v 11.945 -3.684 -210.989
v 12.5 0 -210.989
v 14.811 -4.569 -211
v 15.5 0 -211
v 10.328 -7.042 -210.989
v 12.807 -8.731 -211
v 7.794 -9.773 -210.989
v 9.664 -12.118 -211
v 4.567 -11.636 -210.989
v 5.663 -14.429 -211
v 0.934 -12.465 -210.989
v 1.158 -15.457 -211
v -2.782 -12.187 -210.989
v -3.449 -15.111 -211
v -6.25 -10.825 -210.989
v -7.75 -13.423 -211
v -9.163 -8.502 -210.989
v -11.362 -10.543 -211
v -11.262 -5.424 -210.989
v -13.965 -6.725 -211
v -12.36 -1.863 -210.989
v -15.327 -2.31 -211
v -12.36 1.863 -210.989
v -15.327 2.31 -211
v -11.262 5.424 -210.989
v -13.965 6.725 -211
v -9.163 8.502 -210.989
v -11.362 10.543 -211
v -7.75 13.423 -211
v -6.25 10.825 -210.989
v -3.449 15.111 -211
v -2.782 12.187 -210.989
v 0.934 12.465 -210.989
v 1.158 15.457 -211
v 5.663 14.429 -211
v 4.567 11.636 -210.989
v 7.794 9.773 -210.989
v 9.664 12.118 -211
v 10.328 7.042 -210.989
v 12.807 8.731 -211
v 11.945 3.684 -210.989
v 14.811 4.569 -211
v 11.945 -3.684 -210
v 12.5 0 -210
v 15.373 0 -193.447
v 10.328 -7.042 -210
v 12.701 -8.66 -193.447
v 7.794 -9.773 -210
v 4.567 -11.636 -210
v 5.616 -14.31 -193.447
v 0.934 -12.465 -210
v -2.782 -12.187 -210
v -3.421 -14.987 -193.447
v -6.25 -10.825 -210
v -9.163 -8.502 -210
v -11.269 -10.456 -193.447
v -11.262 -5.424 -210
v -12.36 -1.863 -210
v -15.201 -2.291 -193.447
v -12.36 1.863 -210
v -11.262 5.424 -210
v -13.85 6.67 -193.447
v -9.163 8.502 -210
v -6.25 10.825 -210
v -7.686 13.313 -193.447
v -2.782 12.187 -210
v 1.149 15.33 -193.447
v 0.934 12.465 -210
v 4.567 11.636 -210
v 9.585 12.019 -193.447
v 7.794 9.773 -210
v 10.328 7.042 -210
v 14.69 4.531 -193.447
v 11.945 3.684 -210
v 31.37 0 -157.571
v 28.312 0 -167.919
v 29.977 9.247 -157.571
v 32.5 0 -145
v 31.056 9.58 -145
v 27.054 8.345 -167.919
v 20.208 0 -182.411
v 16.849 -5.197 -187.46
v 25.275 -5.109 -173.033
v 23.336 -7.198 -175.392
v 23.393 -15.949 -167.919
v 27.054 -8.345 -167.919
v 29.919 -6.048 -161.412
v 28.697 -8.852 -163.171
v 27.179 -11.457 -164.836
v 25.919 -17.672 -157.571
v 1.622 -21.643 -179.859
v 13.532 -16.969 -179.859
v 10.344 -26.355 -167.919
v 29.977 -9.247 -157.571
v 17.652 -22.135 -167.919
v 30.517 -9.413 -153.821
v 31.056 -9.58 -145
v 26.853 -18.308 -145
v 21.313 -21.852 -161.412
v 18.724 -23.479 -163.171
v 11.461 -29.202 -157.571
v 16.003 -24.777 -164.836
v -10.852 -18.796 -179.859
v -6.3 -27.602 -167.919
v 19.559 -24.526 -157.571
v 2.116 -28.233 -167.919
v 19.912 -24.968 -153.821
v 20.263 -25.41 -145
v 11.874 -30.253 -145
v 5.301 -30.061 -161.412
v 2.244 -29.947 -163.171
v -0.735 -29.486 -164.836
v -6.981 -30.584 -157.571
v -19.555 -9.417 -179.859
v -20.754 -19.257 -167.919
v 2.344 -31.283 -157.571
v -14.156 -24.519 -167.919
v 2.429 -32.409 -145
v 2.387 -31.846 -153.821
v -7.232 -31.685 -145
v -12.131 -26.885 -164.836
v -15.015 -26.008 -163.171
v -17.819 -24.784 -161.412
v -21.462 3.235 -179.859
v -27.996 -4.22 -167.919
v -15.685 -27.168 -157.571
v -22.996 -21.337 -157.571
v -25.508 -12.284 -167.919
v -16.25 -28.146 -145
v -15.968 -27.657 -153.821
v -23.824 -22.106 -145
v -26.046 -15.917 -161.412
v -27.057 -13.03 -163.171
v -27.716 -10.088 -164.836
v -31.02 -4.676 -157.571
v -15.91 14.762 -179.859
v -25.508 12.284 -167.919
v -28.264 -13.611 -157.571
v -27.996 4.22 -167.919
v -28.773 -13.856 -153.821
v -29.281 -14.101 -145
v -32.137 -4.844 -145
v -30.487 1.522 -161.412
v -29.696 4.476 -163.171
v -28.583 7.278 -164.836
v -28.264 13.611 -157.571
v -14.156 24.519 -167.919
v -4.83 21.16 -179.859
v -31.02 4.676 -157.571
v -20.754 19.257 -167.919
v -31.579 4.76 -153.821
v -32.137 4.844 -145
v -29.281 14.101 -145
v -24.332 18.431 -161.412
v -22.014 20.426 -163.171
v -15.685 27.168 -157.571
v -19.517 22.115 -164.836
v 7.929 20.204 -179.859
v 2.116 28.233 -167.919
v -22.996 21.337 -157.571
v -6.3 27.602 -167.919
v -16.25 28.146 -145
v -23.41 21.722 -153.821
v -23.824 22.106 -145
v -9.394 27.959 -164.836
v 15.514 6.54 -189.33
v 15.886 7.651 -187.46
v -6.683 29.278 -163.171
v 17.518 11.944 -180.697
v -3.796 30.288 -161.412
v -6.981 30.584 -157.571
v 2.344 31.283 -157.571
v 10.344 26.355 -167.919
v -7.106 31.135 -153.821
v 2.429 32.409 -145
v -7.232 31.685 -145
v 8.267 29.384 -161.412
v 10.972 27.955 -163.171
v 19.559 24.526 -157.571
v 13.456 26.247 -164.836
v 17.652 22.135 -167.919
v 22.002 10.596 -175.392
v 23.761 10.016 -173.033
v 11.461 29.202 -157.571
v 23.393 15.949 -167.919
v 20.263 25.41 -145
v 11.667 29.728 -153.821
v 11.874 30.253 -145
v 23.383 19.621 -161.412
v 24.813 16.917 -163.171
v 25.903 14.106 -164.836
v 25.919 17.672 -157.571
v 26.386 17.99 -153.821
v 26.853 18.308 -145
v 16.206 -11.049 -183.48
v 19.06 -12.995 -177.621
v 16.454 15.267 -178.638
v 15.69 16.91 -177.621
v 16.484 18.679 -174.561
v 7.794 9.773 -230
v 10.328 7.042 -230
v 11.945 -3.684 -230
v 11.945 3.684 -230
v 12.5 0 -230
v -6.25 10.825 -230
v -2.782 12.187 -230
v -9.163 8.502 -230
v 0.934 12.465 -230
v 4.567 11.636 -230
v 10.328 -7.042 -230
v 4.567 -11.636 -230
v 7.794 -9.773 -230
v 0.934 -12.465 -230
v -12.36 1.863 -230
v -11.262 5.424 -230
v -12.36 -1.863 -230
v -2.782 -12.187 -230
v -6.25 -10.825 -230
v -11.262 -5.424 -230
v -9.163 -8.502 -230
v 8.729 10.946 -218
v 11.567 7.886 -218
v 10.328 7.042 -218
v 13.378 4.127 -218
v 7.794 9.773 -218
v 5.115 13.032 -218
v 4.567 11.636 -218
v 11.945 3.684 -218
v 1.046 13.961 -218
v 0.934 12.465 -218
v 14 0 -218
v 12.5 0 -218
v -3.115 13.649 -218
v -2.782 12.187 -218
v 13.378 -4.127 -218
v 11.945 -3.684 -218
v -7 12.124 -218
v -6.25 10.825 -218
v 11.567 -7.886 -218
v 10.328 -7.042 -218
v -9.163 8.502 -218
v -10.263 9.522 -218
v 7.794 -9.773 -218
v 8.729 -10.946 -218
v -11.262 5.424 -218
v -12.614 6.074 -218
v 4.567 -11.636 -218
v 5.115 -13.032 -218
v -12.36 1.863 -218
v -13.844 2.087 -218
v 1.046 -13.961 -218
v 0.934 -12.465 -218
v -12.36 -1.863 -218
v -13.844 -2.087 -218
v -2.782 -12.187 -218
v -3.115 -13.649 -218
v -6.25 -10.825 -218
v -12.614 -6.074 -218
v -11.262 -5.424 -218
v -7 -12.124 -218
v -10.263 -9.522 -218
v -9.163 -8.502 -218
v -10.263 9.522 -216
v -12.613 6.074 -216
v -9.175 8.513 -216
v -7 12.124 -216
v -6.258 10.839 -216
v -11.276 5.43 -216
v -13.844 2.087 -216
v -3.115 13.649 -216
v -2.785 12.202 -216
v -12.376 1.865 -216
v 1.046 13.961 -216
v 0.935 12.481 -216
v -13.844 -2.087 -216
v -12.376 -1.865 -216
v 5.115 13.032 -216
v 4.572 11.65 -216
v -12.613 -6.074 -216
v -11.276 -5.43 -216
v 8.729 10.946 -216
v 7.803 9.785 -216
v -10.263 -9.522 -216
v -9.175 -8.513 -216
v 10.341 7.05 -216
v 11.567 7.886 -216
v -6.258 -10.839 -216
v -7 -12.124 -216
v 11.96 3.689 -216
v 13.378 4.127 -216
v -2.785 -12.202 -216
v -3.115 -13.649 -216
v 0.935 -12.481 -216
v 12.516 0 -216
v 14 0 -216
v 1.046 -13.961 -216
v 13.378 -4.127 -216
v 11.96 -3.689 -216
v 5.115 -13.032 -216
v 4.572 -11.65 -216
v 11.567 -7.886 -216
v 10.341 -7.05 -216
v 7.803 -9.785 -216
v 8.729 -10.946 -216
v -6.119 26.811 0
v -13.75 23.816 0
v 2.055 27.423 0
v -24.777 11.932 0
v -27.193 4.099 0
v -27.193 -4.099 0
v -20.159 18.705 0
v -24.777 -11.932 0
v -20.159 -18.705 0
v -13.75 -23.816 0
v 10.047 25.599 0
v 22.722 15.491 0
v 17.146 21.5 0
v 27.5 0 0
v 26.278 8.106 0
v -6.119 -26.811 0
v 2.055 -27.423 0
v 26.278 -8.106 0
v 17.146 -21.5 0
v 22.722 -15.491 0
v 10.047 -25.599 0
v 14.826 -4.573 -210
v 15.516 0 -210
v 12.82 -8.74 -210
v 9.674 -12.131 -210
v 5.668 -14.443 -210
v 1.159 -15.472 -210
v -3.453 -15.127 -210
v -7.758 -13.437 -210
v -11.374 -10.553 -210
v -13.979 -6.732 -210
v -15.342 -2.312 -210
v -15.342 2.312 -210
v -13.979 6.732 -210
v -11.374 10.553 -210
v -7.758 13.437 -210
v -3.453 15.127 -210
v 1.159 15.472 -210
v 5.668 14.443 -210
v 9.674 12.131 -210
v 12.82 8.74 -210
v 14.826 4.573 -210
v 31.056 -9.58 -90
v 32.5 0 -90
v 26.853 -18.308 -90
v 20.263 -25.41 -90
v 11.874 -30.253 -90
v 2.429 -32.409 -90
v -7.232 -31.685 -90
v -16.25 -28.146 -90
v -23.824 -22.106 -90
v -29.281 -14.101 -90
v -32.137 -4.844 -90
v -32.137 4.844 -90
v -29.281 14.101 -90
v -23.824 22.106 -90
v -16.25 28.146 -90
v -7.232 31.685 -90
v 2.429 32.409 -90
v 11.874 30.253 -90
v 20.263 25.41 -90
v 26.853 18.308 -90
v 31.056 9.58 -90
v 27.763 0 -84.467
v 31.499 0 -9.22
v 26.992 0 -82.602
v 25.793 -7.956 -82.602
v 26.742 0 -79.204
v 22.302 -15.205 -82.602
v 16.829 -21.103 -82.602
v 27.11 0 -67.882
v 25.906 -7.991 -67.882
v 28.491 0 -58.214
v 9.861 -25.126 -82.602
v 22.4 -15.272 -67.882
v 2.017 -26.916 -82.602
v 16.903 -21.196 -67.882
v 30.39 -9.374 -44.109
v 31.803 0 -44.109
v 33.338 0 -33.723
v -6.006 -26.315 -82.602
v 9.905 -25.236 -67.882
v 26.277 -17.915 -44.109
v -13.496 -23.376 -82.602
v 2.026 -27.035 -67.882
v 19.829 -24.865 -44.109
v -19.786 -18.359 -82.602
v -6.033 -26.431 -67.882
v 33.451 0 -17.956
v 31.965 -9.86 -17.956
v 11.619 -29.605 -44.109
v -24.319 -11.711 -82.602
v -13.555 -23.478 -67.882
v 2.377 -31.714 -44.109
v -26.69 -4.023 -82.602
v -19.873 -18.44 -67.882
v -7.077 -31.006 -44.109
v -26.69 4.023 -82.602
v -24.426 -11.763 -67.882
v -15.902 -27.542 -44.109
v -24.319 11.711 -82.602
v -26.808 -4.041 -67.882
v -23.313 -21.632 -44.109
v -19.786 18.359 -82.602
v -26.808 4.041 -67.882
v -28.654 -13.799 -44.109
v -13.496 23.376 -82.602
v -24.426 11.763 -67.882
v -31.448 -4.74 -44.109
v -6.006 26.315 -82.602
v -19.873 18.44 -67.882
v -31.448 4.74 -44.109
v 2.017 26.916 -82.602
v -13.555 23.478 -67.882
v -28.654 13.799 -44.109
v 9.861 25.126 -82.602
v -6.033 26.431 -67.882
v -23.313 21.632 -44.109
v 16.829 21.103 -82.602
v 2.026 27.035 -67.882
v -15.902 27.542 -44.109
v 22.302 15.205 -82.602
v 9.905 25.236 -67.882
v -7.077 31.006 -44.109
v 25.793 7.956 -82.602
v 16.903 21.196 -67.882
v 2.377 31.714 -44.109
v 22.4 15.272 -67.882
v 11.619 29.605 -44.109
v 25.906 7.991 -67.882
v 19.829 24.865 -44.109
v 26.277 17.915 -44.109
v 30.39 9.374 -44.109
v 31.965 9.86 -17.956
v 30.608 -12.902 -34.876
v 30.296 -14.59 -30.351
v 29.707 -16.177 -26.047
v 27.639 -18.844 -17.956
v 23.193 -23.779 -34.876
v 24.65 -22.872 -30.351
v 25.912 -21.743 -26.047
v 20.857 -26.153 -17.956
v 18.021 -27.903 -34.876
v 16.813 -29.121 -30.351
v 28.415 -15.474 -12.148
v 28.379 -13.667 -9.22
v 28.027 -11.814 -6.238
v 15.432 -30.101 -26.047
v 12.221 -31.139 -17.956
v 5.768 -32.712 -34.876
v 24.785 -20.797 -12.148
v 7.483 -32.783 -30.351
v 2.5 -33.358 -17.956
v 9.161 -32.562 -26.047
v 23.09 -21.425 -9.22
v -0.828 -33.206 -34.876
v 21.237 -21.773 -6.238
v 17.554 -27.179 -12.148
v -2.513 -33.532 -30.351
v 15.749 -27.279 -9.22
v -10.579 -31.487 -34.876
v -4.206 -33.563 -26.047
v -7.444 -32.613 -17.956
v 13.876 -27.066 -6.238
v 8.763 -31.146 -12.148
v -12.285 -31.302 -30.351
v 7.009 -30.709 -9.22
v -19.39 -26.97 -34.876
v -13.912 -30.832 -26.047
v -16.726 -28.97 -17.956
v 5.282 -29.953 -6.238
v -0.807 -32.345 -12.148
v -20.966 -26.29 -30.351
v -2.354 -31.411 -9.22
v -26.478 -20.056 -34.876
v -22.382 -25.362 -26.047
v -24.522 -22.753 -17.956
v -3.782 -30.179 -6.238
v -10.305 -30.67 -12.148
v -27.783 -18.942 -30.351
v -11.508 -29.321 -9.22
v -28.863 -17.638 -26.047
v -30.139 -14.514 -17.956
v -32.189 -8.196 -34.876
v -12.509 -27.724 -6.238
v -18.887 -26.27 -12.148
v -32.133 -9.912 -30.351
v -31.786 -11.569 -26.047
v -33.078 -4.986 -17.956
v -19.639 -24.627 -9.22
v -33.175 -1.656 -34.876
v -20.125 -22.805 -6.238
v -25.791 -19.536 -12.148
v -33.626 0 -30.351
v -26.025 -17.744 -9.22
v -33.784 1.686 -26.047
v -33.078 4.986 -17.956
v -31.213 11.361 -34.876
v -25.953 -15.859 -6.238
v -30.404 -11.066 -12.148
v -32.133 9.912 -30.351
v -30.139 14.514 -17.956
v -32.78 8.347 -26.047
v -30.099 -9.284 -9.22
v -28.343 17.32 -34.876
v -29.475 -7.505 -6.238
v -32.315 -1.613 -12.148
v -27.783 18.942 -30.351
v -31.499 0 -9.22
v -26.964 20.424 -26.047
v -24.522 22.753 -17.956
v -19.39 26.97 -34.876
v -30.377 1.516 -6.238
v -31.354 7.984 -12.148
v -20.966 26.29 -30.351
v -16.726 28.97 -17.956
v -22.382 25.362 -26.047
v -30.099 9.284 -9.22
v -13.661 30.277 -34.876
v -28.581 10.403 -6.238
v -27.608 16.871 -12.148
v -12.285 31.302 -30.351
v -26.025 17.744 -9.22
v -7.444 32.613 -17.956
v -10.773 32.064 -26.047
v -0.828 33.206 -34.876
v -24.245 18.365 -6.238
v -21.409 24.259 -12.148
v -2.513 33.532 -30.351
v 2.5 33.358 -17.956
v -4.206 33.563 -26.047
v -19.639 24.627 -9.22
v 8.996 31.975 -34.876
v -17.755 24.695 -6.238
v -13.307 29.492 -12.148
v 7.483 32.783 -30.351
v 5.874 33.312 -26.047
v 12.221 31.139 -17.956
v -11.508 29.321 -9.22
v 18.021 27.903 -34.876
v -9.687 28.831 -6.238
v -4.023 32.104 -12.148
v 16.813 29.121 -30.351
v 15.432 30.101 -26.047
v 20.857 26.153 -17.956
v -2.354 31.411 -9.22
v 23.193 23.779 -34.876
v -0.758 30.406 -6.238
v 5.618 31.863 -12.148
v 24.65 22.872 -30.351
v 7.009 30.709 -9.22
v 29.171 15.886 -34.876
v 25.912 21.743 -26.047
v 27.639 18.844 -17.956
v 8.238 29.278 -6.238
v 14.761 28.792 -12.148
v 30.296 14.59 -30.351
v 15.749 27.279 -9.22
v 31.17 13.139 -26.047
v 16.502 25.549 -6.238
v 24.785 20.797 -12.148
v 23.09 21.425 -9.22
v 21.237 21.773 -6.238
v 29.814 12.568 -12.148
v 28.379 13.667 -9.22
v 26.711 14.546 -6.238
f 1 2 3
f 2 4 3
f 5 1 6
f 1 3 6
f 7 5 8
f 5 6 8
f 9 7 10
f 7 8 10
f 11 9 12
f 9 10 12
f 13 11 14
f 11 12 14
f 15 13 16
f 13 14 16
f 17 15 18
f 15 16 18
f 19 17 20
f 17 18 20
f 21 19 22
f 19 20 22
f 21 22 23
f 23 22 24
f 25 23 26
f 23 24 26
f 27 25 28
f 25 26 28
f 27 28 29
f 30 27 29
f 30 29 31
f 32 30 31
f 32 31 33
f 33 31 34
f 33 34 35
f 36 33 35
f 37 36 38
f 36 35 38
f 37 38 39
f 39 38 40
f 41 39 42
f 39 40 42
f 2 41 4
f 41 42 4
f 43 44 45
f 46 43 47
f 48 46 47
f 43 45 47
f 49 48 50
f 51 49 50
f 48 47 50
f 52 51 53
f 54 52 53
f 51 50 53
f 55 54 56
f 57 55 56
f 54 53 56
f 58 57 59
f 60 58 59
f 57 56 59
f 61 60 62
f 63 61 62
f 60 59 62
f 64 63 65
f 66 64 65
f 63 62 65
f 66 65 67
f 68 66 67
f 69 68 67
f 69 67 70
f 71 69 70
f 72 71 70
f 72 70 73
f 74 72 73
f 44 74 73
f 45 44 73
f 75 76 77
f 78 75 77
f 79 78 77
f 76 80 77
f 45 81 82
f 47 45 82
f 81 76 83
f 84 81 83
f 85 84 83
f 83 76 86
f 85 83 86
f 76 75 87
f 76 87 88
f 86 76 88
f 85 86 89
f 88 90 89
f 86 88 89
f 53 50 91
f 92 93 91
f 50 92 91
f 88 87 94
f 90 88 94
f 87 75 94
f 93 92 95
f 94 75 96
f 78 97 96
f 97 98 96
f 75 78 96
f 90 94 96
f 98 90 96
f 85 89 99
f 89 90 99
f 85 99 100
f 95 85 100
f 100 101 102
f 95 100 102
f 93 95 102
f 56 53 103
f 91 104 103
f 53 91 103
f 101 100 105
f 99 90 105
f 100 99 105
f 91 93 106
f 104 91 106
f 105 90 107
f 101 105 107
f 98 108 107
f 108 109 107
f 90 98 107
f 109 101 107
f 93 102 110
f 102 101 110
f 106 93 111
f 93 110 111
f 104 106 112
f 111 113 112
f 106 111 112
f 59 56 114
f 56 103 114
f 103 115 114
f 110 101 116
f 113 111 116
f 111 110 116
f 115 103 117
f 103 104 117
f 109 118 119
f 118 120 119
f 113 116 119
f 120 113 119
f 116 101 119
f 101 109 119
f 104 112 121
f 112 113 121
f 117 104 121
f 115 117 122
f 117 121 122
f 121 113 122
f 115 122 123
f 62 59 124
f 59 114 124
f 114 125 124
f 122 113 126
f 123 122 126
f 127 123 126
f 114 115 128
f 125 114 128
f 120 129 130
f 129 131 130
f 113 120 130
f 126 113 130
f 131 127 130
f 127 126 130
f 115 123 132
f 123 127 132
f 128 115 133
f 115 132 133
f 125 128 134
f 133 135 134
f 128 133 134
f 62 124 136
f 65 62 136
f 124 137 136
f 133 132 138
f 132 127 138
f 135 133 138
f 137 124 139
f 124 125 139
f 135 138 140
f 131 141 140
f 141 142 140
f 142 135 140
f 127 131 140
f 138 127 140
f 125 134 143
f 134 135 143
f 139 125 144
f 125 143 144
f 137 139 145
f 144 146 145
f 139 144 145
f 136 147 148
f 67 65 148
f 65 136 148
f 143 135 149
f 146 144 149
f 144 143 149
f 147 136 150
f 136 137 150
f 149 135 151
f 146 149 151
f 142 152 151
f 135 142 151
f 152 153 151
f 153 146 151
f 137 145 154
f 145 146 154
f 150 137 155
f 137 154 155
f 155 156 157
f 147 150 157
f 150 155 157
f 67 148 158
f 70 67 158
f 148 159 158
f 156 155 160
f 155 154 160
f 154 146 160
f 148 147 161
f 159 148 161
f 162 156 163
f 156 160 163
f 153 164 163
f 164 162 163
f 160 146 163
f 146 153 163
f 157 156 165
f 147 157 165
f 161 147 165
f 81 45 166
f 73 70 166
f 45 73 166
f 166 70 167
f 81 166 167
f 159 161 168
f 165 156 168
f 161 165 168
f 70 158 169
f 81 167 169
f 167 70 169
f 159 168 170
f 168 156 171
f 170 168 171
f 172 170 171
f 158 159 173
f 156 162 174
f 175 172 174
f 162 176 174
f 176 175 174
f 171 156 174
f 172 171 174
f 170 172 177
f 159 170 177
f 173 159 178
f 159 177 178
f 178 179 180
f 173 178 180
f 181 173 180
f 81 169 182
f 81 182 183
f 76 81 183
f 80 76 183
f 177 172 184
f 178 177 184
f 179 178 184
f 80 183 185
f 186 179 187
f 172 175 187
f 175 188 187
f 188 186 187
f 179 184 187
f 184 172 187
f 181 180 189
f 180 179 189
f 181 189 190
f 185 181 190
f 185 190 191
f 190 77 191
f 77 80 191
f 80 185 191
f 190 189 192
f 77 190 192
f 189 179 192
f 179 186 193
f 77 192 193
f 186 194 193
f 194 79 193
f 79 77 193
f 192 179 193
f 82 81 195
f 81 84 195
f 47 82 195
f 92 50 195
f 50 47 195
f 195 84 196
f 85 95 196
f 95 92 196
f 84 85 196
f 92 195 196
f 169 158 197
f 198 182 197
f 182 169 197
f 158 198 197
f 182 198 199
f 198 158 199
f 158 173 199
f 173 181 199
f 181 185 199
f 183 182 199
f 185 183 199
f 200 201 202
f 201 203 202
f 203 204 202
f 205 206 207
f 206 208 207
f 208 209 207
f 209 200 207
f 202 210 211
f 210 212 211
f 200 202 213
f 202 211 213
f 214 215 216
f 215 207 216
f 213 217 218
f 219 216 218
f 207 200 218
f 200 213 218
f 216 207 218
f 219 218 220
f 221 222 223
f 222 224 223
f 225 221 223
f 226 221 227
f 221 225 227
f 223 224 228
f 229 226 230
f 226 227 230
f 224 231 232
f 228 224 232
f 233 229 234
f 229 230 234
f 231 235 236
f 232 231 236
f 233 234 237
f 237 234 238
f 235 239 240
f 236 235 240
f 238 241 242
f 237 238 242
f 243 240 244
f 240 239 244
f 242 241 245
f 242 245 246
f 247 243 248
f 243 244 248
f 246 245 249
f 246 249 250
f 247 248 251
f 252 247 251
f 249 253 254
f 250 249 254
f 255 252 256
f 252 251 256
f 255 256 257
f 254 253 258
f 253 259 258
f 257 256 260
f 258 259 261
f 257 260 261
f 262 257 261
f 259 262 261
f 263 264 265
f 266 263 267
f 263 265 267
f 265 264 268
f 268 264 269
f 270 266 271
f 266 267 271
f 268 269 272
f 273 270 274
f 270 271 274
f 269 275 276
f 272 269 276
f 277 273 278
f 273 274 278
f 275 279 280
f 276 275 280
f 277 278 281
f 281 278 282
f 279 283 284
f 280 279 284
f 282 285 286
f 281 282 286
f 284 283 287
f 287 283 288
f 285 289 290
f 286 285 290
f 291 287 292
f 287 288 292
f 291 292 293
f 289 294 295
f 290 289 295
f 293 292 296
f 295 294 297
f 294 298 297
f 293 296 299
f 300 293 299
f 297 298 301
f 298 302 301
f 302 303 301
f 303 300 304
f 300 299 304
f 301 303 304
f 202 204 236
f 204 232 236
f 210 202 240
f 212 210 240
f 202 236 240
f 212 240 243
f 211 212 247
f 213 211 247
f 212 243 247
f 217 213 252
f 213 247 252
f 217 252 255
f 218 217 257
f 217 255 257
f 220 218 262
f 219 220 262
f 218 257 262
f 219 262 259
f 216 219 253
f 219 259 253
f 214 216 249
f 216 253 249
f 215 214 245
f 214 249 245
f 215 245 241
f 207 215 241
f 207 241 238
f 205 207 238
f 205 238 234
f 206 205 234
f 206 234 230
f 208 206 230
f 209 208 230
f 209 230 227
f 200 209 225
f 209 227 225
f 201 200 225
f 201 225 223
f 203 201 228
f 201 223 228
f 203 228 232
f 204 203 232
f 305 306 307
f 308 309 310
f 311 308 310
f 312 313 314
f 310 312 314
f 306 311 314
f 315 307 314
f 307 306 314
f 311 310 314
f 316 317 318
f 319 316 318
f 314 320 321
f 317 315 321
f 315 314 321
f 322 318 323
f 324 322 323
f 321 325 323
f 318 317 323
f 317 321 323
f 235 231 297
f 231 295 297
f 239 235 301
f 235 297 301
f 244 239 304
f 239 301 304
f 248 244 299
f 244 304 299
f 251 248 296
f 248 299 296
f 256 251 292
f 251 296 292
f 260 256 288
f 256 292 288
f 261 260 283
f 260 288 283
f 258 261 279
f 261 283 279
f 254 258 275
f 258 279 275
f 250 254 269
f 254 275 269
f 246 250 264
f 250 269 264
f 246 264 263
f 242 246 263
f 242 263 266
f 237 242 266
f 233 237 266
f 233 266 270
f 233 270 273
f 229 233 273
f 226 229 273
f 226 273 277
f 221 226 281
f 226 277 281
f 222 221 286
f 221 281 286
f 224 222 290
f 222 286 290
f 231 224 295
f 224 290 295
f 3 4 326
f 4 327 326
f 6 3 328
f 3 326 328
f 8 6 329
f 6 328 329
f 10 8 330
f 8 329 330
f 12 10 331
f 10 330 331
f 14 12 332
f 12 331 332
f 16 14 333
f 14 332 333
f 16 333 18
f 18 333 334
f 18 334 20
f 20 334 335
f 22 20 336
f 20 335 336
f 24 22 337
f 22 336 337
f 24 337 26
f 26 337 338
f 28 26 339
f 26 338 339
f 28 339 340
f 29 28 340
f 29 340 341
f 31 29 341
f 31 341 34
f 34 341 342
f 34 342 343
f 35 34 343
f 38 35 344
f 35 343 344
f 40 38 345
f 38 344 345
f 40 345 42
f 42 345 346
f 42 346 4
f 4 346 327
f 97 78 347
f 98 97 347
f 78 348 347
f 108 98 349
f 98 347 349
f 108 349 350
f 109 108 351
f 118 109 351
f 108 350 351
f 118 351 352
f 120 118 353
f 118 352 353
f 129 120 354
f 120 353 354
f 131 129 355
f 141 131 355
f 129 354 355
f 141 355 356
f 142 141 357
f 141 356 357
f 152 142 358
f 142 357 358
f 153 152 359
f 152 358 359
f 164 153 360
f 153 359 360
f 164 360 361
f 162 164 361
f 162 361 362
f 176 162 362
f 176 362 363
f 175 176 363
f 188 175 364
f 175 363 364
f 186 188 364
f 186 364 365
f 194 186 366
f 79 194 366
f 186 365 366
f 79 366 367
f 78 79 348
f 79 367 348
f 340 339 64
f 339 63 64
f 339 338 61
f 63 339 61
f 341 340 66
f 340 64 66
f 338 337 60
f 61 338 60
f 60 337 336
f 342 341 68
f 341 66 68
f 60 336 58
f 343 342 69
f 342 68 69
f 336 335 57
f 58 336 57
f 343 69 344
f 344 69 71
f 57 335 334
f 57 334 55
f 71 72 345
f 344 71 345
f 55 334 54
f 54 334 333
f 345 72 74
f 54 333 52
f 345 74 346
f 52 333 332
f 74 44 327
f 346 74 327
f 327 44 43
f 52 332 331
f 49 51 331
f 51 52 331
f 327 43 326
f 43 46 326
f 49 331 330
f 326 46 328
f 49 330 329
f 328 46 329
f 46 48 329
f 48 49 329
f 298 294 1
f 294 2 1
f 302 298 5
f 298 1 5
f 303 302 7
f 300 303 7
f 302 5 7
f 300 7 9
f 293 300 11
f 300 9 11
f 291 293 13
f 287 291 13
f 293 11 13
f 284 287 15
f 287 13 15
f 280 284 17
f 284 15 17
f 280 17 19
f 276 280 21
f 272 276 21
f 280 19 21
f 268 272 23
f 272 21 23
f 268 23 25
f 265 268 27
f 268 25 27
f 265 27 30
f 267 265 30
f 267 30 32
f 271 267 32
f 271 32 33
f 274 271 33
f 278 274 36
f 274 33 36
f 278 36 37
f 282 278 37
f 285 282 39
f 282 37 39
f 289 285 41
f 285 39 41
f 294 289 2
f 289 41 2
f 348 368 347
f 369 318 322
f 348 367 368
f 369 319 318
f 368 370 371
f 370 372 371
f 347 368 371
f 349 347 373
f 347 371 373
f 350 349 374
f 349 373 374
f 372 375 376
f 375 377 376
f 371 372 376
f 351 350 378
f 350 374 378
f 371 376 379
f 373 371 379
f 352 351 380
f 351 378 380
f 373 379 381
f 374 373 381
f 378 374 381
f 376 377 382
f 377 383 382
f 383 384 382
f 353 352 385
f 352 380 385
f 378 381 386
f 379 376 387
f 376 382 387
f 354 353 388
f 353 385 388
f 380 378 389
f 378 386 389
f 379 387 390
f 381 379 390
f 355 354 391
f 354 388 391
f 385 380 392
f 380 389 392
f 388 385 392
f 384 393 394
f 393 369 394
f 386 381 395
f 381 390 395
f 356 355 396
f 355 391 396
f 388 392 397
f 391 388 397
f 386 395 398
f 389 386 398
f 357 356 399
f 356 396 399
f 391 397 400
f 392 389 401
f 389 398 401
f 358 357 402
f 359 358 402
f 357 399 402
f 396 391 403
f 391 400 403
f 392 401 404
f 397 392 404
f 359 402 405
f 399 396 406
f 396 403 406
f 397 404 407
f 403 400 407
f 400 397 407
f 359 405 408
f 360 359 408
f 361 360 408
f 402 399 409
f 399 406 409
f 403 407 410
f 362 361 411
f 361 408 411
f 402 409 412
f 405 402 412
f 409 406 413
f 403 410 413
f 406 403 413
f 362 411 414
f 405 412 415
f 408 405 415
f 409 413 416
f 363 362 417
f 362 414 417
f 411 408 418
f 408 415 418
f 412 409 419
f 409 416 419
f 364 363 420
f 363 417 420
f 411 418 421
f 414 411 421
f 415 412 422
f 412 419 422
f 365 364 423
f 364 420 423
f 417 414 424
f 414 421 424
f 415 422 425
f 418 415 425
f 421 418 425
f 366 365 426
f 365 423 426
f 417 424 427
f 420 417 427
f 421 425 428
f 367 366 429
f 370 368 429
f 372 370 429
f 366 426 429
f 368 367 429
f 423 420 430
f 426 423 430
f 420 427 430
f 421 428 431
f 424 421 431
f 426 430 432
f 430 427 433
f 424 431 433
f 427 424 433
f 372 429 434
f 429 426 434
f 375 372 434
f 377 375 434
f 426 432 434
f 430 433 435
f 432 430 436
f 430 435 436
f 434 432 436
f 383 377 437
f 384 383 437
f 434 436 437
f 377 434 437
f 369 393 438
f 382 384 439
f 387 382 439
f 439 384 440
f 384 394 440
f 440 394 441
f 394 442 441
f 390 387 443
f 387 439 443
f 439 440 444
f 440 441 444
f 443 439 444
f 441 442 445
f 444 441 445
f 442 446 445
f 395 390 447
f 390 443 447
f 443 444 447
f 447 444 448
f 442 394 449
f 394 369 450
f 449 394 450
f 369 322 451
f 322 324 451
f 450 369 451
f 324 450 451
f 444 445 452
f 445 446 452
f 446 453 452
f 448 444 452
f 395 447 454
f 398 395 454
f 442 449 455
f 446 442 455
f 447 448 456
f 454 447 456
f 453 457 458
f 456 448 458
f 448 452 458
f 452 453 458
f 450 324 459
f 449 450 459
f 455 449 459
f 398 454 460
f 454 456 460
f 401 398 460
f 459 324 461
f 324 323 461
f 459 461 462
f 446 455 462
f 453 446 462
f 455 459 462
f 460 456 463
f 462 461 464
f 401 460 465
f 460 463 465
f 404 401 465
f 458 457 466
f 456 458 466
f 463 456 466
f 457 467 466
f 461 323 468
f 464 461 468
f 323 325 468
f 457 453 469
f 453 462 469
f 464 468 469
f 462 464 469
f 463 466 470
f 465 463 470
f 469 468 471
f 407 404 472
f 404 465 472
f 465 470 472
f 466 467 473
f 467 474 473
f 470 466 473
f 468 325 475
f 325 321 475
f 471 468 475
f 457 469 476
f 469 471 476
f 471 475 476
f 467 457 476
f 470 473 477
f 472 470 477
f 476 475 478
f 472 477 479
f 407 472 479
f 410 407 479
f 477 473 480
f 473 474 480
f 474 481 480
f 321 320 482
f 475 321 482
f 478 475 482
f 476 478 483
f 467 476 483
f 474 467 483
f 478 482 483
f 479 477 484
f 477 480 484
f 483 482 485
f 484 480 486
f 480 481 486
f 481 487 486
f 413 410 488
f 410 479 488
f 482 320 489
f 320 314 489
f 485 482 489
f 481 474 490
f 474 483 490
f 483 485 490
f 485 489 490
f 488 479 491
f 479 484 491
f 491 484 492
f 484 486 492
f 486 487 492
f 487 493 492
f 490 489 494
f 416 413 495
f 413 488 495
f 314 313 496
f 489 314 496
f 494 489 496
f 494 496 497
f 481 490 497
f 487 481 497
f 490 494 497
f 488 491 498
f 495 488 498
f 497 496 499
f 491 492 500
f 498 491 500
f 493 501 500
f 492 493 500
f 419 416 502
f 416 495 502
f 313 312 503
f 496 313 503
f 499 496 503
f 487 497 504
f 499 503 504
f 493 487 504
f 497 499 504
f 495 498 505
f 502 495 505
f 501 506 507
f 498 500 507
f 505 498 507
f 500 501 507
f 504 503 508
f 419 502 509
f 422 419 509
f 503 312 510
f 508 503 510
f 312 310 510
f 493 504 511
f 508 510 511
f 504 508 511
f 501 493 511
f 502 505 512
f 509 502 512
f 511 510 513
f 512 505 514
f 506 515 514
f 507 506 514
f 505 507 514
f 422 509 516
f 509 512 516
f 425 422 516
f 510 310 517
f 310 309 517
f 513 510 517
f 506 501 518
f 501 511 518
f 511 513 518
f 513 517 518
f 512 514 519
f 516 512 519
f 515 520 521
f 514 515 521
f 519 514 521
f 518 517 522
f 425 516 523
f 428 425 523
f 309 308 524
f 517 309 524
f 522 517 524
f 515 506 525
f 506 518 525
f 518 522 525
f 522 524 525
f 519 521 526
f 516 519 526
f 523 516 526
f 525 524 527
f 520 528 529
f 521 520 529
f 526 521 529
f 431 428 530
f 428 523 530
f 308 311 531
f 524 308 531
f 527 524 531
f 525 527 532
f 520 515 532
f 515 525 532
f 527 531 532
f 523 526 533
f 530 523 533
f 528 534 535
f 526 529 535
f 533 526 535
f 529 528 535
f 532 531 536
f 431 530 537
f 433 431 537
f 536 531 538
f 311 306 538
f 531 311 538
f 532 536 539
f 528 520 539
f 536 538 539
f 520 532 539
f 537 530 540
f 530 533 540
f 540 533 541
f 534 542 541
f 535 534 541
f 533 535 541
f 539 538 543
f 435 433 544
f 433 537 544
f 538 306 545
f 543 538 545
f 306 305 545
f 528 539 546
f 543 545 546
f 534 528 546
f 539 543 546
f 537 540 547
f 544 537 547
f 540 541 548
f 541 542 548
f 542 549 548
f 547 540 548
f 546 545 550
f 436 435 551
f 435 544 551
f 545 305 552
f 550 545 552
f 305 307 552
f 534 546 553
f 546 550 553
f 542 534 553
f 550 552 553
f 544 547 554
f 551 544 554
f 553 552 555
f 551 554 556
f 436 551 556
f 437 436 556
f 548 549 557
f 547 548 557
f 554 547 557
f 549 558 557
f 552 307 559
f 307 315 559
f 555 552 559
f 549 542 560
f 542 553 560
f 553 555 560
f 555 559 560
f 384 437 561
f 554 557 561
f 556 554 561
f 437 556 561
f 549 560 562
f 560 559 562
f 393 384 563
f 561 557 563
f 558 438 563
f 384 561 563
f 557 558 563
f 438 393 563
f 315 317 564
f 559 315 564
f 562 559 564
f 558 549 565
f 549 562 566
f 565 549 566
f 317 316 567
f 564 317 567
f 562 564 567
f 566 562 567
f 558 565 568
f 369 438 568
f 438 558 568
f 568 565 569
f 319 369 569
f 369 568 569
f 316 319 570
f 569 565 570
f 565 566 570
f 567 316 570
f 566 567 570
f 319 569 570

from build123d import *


with BuildPart() as part:
    # Sketch1 → Revolve3 (revolve)
    with BuildSketch(Plane(origin=(0, 0, 0), x_dir=(1, 0, 0), z_dir=(0, 1, 0))):
        with BuildLine():
            Line((0, 0), (0, 230))
            Line((0, 230), (12.5, 230))
            Line((12.5, 230), (12.5, 218))
            Line((12.5, 218), (14, 217.999999999))
            Line((14, 217.999999999), (13.999927666, 216))
            Line((13.999927666, 216), (12.515611153, 216))
            Line((12.515611153, 216), (12.5, 210.98853812))
            Line((12.5, 210.98853812), (15.499978569, 210.999877804))
            Line((15.499978569, 210.999877804), (15.515611153, 210))
            Line((15.515611153, 210), (12.5, 210))
            add(Edge.make_bspline(
                [(12.5, 210), (14.922130771, 175.127506462), (31.979338754, 179.564350306), (32.5, 145)],
                knots=[0, 0, 0, 0, 1, 1, 1, 1], degree=3))
            Line((32.5, 145), (32.5, 90))
            add(Edge.make_bspline(
                [(32.5, 90), (25.721809169, 83.316192042), (26.936513276, 82.414233108), (26.810048481, 66.997733089), (28.46817148, 57.131214713), (32.096286638, 44.010772021), (34.987931681, 23.776222362), (33.214929298, 10.739901), (27.5, 0)],
                knots=[0, 0, 0, 0, 0.249131323, 0.300005802, 0.485551569, 0.527189357, 0.693190465, 1, 1, 1, 1], degree=3))
            Line((27.5, 0), (0, 0))
        make_face()
    revolve(axis=Axis((0, 0, 0), (0, 0, -1)))


solid = part.part
